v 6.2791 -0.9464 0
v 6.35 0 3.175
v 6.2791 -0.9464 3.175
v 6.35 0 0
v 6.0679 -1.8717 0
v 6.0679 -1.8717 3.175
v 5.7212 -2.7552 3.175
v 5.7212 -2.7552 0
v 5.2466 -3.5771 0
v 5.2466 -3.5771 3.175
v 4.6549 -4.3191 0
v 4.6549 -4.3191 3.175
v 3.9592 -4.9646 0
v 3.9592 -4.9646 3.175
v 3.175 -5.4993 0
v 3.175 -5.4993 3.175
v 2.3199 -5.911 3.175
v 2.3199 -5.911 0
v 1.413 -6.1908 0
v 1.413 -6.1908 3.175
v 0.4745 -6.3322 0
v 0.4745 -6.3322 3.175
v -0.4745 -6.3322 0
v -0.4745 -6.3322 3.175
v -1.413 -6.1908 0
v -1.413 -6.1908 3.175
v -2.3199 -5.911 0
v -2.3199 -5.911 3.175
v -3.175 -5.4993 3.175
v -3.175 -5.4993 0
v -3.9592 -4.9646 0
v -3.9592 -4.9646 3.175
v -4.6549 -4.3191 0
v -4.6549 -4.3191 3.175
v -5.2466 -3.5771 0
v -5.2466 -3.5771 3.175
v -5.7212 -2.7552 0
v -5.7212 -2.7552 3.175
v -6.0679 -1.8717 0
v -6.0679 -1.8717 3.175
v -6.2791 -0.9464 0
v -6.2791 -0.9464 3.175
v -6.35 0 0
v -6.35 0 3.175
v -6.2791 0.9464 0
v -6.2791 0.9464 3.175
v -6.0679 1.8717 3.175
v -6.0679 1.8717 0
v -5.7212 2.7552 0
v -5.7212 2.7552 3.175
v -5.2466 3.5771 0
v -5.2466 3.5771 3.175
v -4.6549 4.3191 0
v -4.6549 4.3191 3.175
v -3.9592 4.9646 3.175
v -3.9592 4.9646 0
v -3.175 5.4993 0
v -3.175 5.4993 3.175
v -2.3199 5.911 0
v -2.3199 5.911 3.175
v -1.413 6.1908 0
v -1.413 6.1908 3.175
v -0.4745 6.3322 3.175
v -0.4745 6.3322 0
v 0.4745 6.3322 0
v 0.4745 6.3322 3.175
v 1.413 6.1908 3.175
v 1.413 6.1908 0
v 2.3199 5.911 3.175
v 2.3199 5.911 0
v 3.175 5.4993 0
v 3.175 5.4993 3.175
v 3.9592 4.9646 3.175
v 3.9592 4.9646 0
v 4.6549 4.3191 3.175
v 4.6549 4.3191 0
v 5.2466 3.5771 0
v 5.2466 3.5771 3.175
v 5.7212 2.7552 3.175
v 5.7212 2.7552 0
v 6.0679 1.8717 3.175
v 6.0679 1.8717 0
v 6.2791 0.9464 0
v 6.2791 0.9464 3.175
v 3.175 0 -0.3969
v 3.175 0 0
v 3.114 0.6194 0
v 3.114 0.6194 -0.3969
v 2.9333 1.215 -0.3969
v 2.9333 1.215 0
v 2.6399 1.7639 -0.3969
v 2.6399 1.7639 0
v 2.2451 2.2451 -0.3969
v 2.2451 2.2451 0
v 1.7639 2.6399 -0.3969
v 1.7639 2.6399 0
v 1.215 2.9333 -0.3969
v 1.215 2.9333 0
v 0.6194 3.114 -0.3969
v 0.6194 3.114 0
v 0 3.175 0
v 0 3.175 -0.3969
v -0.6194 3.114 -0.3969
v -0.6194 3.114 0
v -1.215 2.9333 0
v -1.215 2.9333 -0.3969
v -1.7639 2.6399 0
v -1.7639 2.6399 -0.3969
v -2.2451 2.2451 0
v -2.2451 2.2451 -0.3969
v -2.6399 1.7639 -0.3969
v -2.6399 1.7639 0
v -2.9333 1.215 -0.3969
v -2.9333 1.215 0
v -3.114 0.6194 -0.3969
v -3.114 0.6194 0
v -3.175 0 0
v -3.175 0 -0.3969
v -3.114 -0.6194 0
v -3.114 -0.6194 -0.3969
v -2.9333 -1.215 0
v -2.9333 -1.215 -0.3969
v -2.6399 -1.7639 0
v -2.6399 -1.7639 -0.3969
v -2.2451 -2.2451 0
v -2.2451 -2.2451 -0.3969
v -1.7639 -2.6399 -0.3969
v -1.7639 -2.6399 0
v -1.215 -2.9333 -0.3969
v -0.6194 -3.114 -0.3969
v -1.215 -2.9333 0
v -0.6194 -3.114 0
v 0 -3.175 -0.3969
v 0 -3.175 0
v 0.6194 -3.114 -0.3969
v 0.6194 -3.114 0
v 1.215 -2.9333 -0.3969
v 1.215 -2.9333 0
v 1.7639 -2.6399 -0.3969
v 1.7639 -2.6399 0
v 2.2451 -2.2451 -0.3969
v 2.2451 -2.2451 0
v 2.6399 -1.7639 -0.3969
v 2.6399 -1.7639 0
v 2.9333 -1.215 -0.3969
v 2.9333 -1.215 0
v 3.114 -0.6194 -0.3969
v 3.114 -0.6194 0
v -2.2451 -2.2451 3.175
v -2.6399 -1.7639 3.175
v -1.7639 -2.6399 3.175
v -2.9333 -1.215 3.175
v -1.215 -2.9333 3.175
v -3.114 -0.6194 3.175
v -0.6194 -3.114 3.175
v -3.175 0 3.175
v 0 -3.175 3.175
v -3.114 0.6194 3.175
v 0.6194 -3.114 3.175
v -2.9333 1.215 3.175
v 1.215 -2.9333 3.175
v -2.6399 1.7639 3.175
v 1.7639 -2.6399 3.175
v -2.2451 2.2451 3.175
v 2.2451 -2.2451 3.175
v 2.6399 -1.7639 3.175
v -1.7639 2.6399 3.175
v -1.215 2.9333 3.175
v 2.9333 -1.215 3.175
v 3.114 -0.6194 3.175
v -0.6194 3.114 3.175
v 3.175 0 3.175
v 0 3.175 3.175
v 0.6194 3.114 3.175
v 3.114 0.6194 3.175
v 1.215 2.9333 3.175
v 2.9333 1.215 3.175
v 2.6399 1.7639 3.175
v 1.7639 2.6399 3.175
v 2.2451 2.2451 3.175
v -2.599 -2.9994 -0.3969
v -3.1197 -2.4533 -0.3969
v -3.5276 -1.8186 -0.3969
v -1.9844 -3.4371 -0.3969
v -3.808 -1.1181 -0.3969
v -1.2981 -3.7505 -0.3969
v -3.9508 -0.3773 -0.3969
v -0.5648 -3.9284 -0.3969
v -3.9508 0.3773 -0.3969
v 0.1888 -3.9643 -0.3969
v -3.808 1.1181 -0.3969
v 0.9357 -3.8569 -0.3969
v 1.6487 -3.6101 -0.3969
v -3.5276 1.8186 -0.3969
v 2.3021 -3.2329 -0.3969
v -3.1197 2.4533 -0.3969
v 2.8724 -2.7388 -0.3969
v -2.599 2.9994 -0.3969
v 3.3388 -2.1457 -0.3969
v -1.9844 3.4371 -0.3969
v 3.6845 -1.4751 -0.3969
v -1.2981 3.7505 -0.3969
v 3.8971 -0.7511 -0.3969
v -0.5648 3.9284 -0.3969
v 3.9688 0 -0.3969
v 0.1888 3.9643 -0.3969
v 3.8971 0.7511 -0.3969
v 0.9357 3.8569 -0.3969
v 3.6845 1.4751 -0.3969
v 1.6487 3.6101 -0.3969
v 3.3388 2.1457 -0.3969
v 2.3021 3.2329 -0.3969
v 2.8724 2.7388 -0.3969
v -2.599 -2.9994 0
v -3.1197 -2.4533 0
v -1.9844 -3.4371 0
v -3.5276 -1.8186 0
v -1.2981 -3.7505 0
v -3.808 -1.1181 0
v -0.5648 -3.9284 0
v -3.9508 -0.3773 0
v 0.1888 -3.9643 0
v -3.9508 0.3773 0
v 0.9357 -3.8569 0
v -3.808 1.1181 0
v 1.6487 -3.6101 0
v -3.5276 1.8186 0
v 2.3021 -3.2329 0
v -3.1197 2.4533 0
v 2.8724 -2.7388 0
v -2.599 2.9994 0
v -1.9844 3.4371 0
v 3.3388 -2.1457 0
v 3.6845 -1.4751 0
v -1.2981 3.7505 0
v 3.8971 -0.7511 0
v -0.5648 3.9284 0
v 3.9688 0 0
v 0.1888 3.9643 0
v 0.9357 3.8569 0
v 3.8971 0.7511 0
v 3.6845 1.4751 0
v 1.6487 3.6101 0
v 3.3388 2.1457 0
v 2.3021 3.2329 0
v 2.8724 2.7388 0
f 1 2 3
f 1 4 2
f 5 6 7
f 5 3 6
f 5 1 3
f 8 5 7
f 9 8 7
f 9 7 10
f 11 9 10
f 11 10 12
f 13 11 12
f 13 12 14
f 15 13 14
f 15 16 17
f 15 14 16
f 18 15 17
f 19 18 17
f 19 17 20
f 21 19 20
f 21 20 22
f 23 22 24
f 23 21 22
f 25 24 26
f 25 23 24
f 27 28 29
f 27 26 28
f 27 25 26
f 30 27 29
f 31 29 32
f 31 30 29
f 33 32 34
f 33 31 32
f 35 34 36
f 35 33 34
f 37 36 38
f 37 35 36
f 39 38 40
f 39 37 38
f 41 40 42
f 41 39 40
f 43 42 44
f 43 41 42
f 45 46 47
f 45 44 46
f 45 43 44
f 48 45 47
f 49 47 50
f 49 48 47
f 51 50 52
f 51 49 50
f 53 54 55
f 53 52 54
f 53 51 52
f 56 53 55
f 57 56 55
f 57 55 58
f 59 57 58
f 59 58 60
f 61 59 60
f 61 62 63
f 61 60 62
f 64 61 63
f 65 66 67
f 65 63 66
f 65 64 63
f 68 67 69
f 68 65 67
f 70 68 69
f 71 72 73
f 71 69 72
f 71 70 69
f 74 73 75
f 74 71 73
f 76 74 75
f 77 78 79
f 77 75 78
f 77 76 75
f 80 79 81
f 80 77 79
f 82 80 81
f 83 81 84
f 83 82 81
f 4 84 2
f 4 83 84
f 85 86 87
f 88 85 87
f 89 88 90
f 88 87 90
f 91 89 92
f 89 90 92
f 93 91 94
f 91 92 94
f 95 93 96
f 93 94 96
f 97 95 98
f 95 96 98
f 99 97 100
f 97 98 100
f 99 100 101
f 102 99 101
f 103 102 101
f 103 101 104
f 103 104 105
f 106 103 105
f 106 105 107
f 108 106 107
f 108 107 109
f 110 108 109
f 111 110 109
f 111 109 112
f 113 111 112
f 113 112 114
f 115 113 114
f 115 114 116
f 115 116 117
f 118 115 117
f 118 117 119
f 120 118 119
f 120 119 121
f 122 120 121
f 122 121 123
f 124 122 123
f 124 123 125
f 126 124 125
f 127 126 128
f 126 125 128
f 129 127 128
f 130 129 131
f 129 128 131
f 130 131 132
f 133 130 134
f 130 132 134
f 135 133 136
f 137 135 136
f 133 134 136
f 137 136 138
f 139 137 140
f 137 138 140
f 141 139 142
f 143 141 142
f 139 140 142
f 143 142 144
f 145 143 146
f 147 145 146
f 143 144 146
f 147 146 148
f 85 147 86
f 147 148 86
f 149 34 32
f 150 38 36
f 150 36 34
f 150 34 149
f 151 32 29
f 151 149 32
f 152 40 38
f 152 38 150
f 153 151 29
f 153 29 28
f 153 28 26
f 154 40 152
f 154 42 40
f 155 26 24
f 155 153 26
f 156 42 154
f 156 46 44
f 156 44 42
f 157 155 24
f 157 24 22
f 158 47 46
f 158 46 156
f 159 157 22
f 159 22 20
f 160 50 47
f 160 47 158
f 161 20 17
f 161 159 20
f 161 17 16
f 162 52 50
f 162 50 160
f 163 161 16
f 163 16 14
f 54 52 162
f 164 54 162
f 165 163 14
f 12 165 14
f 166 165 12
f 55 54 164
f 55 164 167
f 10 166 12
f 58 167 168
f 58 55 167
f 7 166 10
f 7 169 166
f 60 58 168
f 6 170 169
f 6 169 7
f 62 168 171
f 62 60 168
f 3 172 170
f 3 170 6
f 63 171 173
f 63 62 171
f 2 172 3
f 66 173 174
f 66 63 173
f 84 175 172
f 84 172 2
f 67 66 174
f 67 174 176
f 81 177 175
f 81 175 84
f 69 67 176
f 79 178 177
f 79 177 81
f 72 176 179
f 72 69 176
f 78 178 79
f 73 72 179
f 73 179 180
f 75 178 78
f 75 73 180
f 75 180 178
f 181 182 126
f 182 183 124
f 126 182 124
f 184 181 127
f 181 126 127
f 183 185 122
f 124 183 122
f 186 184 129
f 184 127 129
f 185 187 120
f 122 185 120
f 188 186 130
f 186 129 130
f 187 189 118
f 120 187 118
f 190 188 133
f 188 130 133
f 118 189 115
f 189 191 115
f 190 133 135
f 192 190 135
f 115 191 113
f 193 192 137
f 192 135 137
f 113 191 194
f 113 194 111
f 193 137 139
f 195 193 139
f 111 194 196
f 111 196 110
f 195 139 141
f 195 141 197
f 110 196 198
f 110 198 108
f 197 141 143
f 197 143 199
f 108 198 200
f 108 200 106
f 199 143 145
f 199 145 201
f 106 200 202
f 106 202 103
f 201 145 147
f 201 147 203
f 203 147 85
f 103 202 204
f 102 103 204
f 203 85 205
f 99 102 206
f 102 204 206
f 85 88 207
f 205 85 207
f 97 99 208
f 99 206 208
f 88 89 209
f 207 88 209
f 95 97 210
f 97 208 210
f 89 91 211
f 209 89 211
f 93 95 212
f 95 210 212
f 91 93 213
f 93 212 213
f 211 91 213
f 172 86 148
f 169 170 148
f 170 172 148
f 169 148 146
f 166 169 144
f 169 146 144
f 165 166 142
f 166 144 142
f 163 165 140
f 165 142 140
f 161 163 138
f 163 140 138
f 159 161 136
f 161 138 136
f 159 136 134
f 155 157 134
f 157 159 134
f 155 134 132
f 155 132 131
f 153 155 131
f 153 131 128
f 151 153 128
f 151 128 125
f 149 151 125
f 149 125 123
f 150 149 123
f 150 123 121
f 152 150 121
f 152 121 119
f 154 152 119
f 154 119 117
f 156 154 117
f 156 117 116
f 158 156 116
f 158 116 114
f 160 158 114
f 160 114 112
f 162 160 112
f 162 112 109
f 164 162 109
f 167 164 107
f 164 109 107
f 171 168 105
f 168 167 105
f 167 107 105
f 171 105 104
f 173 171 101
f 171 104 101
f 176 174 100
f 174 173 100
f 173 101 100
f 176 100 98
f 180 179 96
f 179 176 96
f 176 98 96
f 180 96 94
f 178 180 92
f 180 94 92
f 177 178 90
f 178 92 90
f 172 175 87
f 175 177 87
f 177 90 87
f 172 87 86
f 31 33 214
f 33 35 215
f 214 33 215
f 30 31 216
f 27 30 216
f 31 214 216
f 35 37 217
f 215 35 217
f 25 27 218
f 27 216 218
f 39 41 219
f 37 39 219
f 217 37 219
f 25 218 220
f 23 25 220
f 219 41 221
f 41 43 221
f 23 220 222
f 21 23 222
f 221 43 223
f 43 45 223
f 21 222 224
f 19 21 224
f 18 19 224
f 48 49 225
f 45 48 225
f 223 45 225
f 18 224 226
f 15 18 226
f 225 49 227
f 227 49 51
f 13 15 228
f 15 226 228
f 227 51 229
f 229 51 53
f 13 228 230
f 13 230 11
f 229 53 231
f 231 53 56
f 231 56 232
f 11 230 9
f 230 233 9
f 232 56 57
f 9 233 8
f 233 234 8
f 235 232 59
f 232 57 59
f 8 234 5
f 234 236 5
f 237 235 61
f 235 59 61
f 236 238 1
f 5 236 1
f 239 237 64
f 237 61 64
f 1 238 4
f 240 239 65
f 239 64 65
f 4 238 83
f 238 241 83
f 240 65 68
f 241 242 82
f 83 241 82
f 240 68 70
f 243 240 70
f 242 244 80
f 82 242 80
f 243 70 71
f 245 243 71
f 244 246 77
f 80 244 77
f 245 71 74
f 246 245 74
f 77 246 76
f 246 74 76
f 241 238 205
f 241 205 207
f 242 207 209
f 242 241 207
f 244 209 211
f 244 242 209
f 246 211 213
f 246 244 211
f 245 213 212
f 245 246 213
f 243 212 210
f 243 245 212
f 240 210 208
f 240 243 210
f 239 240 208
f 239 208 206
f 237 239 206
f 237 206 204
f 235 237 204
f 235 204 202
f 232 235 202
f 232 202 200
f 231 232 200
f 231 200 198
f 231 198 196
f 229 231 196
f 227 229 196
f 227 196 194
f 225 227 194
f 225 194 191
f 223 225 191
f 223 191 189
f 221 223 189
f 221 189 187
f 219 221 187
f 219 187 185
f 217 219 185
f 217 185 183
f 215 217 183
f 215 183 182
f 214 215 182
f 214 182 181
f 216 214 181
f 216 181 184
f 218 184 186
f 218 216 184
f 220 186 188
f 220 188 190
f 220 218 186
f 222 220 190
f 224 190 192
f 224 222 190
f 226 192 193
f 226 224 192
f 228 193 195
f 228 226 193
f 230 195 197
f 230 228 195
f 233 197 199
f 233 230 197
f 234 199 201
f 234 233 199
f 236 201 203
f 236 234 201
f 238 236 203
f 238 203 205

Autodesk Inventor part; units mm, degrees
ref_plane "YZ Plane" through (0, 0, 0) normal (1, 0, 0) x (0, 1, 0)
ref_plane "XZ Plane" through (0, 0, 0) normal (0, 1, 0) x (-1, 0, 0)
ref_plane "XY Plane" through (0, 0, 0) normal (0, 0, 1) x (1, 0, 0)
sketch "Sketch1" plane through (0, 0, 0) normal (0, 0, 1) x (1, 0, 0)
  circle A0 centre (0, 0) radius 3.175
  circle A1 centre (0, 0) radius 6.35
  circle A2 centre (0, 0) radius 3.9688
  dimension "d0" = 6.35
  dimension "d1" = 12.7
  dimension "d4" = 7.9375
extrude "Extrusion1" add sketch "Sketch1" along normal blind 3.175 contours A1 | A2
extrude "Extrusion2" add sketch "Sketch1" against normal blind 0.3969 contours A2
properties part number "Plastic Gear Bushing"
